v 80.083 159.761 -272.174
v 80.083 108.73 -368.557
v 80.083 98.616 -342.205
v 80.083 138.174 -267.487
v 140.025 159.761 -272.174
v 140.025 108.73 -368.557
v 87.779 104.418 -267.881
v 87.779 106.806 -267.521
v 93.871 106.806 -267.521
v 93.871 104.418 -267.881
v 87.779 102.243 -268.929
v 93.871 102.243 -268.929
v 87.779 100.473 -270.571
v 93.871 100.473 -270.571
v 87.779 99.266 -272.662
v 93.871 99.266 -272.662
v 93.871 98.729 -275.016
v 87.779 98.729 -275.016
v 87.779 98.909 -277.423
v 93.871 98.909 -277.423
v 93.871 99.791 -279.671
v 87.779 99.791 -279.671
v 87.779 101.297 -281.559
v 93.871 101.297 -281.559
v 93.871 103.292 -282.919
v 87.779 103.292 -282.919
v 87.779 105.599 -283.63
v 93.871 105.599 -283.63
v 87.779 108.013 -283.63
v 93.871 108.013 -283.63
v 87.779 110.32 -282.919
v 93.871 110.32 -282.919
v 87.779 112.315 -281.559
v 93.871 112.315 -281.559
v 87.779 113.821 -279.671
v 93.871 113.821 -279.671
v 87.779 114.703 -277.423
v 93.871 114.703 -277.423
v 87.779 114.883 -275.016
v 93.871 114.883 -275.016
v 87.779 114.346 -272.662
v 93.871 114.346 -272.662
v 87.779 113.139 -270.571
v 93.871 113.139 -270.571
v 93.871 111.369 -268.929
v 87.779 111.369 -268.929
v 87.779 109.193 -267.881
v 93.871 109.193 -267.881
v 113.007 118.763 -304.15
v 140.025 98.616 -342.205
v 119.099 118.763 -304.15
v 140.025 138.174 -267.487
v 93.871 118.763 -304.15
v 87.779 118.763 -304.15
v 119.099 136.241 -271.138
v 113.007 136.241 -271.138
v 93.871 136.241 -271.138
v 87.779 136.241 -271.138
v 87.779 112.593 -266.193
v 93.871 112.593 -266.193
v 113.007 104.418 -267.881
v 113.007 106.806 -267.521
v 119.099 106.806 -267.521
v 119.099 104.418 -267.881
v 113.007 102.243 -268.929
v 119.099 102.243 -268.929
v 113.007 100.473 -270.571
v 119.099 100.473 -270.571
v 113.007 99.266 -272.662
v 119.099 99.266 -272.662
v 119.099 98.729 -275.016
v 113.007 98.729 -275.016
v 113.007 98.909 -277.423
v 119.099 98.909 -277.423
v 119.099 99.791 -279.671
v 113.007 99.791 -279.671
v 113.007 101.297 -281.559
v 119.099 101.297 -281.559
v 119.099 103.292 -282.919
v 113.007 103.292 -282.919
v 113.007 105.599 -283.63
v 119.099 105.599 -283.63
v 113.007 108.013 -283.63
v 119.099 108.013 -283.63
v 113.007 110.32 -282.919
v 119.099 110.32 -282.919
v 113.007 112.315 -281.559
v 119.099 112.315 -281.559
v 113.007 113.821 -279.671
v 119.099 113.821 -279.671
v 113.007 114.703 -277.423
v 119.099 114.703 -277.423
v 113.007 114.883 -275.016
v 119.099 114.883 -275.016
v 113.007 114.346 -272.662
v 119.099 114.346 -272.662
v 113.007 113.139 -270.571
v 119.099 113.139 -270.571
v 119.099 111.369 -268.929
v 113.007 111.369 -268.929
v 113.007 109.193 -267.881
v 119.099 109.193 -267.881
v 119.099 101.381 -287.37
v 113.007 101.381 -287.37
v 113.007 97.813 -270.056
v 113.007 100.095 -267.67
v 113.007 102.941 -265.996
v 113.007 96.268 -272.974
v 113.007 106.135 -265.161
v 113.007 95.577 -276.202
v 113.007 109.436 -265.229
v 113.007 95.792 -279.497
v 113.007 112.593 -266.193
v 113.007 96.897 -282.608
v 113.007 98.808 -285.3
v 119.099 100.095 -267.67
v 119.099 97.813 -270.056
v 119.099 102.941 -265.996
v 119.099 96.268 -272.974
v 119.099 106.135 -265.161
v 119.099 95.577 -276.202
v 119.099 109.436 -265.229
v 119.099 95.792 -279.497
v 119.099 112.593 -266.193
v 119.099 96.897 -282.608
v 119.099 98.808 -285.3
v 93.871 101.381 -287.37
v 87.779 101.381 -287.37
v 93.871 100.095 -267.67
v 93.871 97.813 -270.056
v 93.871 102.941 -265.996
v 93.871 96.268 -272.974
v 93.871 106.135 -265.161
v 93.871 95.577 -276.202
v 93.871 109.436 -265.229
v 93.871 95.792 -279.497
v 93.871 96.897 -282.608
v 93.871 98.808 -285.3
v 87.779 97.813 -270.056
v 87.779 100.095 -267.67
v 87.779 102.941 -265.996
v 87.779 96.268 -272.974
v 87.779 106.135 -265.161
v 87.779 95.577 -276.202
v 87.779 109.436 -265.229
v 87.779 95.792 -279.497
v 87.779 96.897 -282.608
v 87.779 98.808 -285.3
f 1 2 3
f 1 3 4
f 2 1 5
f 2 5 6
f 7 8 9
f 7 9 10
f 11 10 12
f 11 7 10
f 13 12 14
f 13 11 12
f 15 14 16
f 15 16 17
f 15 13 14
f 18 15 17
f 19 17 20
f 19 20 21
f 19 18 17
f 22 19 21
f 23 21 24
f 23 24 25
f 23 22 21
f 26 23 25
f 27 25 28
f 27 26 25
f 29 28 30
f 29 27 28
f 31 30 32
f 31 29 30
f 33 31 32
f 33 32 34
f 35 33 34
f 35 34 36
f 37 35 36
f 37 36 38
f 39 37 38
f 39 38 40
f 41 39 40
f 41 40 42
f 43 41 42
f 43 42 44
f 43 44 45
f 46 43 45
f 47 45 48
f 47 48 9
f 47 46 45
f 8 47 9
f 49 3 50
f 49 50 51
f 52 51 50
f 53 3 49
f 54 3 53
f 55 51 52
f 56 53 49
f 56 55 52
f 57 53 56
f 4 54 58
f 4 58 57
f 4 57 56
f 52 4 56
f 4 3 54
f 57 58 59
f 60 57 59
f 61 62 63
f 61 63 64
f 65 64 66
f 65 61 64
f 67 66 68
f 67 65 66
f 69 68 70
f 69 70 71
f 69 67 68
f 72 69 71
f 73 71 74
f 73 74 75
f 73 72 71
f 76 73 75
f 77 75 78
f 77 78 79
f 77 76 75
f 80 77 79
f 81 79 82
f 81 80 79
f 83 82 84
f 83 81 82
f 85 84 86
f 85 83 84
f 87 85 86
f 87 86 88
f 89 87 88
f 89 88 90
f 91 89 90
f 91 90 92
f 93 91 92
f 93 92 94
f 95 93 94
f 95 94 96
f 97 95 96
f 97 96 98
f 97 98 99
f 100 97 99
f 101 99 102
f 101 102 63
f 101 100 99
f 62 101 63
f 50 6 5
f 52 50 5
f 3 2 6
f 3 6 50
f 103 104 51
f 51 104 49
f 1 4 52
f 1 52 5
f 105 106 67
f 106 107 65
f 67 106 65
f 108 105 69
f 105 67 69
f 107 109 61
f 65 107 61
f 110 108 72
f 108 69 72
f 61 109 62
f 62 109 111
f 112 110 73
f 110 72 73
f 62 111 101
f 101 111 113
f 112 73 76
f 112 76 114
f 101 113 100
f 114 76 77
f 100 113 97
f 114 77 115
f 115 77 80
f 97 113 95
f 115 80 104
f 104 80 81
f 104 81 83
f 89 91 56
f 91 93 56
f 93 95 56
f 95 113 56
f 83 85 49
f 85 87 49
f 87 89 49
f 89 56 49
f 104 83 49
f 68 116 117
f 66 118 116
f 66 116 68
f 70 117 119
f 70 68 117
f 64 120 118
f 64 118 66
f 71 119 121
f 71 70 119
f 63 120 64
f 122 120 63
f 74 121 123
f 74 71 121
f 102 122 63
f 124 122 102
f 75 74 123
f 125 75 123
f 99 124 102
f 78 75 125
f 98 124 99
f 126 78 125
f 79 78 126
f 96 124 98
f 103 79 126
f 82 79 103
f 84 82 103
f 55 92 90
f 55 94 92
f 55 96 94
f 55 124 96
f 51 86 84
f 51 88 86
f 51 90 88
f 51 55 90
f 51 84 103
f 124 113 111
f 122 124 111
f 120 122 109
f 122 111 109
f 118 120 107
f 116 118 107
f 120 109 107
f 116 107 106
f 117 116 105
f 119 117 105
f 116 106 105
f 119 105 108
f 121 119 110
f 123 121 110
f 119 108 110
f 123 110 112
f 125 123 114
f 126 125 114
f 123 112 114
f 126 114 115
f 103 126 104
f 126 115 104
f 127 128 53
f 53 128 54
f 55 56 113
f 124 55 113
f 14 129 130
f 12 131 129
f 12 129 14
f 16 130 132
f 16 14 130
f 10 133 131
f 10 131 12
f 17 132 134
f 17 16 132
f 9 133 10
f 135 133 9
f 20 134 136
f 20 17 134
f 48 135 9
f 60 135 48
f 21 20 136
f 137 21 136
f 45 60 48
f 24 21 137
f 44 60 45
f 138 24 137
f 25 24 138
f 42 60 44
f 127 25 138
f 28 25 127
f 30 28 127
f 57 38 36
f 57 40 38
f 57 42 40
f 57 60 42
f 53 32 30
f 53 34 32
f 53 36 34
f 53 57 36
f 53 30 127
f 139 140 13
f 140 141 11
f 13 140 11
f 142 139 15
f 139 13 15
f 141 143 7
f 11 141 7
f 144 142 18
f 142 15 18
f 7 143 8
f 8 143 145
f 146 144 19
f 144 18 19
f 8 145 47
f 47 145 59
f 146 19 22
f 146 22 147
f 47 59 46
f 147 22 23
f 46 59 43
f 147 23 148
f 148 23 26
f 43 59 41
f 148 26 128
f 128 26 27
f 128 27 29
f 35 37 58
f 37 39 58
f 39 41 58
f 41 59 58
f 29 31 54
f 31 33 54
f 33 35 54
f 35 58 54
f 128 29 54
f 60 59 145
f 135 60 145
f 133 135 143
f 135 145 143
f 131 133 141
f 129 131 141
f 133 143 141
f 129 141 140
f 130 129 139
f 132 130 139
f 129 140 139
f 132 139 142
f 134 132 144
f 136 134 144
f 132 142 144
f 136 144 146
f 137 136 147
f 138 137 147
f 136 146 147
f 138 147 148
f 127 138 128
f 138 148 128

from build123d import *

# Parameters (mm, degrees)
BOSS_EXTRUDE1_DEPTH = 59.94146
SKETCH2_R           = 8.099936755
BOSS_EXTRUDE2_DEPTH = 6.09219
BOSS_EXTRUDE3_START = 25.228296
SKETCH2_2_R         = 8.099936755
BOSS_EXTRUDE3_DEPTH = 6.09219


with BuildPart() as part:
    # Sketch1 → Boss-Extrude1 (new body)
    with BuildSketch(Plane(origin=(80.083152, 0, 0), x_dir=(0, 0, -1), z_dir=(1, 0, 0))):
        Polygon((267.4874, 138.173968), (272.174462, 159.761428), (368.557048, 108.729526), (342.20531, 98.6155), align=None)
    extrude(amount=BOSS_EXTRUDE1_DEPTH)

    # Sketch2 → Boss-Extrude2 (add)
    with BuildSketch(Plane(origin=(87.778844, 0, 0), x_dir=(0, 0, -1), z_dir=(1, 0, 0))):
        with BuildLine():
            Line((271.238218, 136.721088), (266.19327, 112.593374))
            ThreePointArc((266.19327, 112.593374), (271.461683784, 96.939756218), (287.369758, 101.381052))
            Line((287.369758, 101.381052), (304.489612, 119.115332))
            Line((304.489612, 119.115332), (271.238218, 136.721088))
        make_face()
        with Locations(Location((275.620988, 106.805984, 0), (0, 0, 180))):
            Circle(SKETCH2_R, mode=Mode.SUBTRACT)
    extrude(amount=BOSS_EXTRUDE2_DEPTH)

    # Sketch2<2> → Boss-Extrude3 (add)
    with BuildSketch(Plane(origin=(87.778844, 0, 0), x_dir=(0, 0, -1), z_dir=(1, 0, 0)).offset(BOSS_EXTRUDE3_START)):
        with BuildLine():
            Line((271.238218, 136.721088), (266.19327, 112.593374))
            ThreePointArc((266.19327, 112.593374), (271.461683784, 96.939756218), (287.369758, 101.381052))
            Line((287.369758, 101.381052), (304.489612, 119.115332))
            Line((304.489612, 119.115332), (271.238218, 136.721088))
        make_face()
        with Locations(Location((275.620988, 106.805984, 0), (0, 0, 180))):
            Circle(SKETCH2_2_R, mode=Mode.SUBTRACT)
    extrude(amount=BOSS_EXTRUDE3_DEPTH)


solid = part.part
